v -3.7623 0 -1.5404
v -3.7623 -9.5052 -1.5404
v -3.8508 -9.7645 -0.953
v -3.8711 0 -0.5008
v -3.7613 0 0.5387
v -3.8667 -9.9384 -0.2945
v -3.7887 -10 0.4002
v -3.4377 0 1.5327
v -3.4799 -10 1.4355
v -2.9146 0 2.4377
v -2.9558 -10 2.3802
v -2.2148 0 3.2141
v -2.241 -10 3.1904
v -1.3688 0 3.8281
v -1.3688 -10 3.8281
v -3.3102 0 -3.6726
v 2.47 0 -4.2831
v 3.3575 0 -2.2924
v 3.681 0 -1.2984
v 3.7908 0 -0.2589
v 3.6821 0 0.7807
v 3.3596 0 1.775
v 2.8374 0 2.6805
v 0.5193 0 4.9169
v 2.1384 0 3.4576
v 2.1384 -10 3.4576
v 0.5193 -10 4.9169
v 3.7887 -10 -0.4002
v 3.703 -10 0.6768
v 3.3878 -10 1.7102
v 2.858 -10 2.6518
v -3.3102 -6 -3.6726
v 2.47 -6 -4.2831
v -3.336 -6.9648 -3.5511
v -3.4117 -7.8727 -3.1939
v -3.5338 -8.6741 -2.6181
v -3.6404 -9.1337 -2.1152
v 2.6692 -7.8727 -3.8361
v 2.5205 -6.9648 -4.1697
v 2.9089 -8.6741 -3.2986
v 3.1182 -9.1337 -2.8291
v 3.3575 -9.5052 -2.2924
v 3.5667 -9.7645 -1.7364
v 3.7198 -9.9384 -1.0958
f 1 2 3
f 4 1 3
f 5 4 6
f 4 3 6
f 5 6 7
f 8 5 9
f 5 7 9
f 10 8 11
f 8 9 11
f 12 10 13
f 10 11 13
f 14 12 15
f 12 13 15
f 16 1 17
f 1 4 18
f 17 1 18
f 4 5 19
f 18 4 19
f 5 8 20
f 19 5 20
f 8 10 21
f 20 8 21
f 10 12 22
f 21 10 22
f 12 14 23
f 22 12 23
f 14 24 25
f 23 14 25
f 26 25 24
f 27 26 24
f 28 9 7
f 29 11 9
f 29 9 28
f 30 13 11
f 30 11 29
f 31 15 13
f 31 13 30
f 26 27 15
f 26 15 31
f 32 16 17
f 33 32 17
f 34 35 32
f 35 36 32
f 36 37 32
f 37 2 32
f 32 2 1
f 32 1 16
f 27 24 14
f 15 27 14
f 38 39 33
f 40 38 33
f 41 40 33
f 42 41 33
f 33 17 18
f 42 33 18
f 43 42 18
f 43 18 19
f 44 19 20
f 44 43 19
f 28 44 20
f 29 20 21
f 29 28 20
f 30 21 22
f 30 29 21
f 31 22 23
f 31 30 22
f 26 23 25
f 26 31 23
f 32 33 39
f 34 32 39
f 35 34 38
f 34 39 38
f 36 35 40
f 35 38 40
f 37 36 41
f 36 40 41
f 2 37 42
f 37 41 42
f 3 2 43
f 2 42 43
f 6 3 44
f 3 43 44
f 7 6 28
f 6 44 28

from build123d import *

# Parameters (mm, degrees)
F1_DEPTH = 10
F2_R     = 4
F3_R     = 5
F4_R     = 5


with BuildPart() as f1:
    # F0 (on Front) → F1 (new body)
    with BuildSketch(Plane.XZ):
        Polygon((4.83675, 1.025512), (0.519318, 4.916923), (-4.515794, 2.013314), (-3.310232, -3.672627), (2.469957, -4.283122), align=None)
    extrude(amount=F1_DEPTH)

    # F2
    f2_edges = [f1.edges().sort_by_distance(p)[0] for p in [
        (-0.420137, -10, -3.977874),
    ]]
    fillet(f2_edges, radius=F2_R)

    # F3
    f3_edges = [f1.edges().sort_by_distance(p)[0] for p in [
        (4.83675, -5, 1.025512),
    ]]
    fillet(f3_edges, radius=F3_R)

    # F4
    f4_edges = [f1.edges().sort_by_distance(p)[0] for p in [
        (-4.515794, -5, 2.013314),
    ]]
    fillet(f4_edges, radius=F4_R)


solid = f1.part
